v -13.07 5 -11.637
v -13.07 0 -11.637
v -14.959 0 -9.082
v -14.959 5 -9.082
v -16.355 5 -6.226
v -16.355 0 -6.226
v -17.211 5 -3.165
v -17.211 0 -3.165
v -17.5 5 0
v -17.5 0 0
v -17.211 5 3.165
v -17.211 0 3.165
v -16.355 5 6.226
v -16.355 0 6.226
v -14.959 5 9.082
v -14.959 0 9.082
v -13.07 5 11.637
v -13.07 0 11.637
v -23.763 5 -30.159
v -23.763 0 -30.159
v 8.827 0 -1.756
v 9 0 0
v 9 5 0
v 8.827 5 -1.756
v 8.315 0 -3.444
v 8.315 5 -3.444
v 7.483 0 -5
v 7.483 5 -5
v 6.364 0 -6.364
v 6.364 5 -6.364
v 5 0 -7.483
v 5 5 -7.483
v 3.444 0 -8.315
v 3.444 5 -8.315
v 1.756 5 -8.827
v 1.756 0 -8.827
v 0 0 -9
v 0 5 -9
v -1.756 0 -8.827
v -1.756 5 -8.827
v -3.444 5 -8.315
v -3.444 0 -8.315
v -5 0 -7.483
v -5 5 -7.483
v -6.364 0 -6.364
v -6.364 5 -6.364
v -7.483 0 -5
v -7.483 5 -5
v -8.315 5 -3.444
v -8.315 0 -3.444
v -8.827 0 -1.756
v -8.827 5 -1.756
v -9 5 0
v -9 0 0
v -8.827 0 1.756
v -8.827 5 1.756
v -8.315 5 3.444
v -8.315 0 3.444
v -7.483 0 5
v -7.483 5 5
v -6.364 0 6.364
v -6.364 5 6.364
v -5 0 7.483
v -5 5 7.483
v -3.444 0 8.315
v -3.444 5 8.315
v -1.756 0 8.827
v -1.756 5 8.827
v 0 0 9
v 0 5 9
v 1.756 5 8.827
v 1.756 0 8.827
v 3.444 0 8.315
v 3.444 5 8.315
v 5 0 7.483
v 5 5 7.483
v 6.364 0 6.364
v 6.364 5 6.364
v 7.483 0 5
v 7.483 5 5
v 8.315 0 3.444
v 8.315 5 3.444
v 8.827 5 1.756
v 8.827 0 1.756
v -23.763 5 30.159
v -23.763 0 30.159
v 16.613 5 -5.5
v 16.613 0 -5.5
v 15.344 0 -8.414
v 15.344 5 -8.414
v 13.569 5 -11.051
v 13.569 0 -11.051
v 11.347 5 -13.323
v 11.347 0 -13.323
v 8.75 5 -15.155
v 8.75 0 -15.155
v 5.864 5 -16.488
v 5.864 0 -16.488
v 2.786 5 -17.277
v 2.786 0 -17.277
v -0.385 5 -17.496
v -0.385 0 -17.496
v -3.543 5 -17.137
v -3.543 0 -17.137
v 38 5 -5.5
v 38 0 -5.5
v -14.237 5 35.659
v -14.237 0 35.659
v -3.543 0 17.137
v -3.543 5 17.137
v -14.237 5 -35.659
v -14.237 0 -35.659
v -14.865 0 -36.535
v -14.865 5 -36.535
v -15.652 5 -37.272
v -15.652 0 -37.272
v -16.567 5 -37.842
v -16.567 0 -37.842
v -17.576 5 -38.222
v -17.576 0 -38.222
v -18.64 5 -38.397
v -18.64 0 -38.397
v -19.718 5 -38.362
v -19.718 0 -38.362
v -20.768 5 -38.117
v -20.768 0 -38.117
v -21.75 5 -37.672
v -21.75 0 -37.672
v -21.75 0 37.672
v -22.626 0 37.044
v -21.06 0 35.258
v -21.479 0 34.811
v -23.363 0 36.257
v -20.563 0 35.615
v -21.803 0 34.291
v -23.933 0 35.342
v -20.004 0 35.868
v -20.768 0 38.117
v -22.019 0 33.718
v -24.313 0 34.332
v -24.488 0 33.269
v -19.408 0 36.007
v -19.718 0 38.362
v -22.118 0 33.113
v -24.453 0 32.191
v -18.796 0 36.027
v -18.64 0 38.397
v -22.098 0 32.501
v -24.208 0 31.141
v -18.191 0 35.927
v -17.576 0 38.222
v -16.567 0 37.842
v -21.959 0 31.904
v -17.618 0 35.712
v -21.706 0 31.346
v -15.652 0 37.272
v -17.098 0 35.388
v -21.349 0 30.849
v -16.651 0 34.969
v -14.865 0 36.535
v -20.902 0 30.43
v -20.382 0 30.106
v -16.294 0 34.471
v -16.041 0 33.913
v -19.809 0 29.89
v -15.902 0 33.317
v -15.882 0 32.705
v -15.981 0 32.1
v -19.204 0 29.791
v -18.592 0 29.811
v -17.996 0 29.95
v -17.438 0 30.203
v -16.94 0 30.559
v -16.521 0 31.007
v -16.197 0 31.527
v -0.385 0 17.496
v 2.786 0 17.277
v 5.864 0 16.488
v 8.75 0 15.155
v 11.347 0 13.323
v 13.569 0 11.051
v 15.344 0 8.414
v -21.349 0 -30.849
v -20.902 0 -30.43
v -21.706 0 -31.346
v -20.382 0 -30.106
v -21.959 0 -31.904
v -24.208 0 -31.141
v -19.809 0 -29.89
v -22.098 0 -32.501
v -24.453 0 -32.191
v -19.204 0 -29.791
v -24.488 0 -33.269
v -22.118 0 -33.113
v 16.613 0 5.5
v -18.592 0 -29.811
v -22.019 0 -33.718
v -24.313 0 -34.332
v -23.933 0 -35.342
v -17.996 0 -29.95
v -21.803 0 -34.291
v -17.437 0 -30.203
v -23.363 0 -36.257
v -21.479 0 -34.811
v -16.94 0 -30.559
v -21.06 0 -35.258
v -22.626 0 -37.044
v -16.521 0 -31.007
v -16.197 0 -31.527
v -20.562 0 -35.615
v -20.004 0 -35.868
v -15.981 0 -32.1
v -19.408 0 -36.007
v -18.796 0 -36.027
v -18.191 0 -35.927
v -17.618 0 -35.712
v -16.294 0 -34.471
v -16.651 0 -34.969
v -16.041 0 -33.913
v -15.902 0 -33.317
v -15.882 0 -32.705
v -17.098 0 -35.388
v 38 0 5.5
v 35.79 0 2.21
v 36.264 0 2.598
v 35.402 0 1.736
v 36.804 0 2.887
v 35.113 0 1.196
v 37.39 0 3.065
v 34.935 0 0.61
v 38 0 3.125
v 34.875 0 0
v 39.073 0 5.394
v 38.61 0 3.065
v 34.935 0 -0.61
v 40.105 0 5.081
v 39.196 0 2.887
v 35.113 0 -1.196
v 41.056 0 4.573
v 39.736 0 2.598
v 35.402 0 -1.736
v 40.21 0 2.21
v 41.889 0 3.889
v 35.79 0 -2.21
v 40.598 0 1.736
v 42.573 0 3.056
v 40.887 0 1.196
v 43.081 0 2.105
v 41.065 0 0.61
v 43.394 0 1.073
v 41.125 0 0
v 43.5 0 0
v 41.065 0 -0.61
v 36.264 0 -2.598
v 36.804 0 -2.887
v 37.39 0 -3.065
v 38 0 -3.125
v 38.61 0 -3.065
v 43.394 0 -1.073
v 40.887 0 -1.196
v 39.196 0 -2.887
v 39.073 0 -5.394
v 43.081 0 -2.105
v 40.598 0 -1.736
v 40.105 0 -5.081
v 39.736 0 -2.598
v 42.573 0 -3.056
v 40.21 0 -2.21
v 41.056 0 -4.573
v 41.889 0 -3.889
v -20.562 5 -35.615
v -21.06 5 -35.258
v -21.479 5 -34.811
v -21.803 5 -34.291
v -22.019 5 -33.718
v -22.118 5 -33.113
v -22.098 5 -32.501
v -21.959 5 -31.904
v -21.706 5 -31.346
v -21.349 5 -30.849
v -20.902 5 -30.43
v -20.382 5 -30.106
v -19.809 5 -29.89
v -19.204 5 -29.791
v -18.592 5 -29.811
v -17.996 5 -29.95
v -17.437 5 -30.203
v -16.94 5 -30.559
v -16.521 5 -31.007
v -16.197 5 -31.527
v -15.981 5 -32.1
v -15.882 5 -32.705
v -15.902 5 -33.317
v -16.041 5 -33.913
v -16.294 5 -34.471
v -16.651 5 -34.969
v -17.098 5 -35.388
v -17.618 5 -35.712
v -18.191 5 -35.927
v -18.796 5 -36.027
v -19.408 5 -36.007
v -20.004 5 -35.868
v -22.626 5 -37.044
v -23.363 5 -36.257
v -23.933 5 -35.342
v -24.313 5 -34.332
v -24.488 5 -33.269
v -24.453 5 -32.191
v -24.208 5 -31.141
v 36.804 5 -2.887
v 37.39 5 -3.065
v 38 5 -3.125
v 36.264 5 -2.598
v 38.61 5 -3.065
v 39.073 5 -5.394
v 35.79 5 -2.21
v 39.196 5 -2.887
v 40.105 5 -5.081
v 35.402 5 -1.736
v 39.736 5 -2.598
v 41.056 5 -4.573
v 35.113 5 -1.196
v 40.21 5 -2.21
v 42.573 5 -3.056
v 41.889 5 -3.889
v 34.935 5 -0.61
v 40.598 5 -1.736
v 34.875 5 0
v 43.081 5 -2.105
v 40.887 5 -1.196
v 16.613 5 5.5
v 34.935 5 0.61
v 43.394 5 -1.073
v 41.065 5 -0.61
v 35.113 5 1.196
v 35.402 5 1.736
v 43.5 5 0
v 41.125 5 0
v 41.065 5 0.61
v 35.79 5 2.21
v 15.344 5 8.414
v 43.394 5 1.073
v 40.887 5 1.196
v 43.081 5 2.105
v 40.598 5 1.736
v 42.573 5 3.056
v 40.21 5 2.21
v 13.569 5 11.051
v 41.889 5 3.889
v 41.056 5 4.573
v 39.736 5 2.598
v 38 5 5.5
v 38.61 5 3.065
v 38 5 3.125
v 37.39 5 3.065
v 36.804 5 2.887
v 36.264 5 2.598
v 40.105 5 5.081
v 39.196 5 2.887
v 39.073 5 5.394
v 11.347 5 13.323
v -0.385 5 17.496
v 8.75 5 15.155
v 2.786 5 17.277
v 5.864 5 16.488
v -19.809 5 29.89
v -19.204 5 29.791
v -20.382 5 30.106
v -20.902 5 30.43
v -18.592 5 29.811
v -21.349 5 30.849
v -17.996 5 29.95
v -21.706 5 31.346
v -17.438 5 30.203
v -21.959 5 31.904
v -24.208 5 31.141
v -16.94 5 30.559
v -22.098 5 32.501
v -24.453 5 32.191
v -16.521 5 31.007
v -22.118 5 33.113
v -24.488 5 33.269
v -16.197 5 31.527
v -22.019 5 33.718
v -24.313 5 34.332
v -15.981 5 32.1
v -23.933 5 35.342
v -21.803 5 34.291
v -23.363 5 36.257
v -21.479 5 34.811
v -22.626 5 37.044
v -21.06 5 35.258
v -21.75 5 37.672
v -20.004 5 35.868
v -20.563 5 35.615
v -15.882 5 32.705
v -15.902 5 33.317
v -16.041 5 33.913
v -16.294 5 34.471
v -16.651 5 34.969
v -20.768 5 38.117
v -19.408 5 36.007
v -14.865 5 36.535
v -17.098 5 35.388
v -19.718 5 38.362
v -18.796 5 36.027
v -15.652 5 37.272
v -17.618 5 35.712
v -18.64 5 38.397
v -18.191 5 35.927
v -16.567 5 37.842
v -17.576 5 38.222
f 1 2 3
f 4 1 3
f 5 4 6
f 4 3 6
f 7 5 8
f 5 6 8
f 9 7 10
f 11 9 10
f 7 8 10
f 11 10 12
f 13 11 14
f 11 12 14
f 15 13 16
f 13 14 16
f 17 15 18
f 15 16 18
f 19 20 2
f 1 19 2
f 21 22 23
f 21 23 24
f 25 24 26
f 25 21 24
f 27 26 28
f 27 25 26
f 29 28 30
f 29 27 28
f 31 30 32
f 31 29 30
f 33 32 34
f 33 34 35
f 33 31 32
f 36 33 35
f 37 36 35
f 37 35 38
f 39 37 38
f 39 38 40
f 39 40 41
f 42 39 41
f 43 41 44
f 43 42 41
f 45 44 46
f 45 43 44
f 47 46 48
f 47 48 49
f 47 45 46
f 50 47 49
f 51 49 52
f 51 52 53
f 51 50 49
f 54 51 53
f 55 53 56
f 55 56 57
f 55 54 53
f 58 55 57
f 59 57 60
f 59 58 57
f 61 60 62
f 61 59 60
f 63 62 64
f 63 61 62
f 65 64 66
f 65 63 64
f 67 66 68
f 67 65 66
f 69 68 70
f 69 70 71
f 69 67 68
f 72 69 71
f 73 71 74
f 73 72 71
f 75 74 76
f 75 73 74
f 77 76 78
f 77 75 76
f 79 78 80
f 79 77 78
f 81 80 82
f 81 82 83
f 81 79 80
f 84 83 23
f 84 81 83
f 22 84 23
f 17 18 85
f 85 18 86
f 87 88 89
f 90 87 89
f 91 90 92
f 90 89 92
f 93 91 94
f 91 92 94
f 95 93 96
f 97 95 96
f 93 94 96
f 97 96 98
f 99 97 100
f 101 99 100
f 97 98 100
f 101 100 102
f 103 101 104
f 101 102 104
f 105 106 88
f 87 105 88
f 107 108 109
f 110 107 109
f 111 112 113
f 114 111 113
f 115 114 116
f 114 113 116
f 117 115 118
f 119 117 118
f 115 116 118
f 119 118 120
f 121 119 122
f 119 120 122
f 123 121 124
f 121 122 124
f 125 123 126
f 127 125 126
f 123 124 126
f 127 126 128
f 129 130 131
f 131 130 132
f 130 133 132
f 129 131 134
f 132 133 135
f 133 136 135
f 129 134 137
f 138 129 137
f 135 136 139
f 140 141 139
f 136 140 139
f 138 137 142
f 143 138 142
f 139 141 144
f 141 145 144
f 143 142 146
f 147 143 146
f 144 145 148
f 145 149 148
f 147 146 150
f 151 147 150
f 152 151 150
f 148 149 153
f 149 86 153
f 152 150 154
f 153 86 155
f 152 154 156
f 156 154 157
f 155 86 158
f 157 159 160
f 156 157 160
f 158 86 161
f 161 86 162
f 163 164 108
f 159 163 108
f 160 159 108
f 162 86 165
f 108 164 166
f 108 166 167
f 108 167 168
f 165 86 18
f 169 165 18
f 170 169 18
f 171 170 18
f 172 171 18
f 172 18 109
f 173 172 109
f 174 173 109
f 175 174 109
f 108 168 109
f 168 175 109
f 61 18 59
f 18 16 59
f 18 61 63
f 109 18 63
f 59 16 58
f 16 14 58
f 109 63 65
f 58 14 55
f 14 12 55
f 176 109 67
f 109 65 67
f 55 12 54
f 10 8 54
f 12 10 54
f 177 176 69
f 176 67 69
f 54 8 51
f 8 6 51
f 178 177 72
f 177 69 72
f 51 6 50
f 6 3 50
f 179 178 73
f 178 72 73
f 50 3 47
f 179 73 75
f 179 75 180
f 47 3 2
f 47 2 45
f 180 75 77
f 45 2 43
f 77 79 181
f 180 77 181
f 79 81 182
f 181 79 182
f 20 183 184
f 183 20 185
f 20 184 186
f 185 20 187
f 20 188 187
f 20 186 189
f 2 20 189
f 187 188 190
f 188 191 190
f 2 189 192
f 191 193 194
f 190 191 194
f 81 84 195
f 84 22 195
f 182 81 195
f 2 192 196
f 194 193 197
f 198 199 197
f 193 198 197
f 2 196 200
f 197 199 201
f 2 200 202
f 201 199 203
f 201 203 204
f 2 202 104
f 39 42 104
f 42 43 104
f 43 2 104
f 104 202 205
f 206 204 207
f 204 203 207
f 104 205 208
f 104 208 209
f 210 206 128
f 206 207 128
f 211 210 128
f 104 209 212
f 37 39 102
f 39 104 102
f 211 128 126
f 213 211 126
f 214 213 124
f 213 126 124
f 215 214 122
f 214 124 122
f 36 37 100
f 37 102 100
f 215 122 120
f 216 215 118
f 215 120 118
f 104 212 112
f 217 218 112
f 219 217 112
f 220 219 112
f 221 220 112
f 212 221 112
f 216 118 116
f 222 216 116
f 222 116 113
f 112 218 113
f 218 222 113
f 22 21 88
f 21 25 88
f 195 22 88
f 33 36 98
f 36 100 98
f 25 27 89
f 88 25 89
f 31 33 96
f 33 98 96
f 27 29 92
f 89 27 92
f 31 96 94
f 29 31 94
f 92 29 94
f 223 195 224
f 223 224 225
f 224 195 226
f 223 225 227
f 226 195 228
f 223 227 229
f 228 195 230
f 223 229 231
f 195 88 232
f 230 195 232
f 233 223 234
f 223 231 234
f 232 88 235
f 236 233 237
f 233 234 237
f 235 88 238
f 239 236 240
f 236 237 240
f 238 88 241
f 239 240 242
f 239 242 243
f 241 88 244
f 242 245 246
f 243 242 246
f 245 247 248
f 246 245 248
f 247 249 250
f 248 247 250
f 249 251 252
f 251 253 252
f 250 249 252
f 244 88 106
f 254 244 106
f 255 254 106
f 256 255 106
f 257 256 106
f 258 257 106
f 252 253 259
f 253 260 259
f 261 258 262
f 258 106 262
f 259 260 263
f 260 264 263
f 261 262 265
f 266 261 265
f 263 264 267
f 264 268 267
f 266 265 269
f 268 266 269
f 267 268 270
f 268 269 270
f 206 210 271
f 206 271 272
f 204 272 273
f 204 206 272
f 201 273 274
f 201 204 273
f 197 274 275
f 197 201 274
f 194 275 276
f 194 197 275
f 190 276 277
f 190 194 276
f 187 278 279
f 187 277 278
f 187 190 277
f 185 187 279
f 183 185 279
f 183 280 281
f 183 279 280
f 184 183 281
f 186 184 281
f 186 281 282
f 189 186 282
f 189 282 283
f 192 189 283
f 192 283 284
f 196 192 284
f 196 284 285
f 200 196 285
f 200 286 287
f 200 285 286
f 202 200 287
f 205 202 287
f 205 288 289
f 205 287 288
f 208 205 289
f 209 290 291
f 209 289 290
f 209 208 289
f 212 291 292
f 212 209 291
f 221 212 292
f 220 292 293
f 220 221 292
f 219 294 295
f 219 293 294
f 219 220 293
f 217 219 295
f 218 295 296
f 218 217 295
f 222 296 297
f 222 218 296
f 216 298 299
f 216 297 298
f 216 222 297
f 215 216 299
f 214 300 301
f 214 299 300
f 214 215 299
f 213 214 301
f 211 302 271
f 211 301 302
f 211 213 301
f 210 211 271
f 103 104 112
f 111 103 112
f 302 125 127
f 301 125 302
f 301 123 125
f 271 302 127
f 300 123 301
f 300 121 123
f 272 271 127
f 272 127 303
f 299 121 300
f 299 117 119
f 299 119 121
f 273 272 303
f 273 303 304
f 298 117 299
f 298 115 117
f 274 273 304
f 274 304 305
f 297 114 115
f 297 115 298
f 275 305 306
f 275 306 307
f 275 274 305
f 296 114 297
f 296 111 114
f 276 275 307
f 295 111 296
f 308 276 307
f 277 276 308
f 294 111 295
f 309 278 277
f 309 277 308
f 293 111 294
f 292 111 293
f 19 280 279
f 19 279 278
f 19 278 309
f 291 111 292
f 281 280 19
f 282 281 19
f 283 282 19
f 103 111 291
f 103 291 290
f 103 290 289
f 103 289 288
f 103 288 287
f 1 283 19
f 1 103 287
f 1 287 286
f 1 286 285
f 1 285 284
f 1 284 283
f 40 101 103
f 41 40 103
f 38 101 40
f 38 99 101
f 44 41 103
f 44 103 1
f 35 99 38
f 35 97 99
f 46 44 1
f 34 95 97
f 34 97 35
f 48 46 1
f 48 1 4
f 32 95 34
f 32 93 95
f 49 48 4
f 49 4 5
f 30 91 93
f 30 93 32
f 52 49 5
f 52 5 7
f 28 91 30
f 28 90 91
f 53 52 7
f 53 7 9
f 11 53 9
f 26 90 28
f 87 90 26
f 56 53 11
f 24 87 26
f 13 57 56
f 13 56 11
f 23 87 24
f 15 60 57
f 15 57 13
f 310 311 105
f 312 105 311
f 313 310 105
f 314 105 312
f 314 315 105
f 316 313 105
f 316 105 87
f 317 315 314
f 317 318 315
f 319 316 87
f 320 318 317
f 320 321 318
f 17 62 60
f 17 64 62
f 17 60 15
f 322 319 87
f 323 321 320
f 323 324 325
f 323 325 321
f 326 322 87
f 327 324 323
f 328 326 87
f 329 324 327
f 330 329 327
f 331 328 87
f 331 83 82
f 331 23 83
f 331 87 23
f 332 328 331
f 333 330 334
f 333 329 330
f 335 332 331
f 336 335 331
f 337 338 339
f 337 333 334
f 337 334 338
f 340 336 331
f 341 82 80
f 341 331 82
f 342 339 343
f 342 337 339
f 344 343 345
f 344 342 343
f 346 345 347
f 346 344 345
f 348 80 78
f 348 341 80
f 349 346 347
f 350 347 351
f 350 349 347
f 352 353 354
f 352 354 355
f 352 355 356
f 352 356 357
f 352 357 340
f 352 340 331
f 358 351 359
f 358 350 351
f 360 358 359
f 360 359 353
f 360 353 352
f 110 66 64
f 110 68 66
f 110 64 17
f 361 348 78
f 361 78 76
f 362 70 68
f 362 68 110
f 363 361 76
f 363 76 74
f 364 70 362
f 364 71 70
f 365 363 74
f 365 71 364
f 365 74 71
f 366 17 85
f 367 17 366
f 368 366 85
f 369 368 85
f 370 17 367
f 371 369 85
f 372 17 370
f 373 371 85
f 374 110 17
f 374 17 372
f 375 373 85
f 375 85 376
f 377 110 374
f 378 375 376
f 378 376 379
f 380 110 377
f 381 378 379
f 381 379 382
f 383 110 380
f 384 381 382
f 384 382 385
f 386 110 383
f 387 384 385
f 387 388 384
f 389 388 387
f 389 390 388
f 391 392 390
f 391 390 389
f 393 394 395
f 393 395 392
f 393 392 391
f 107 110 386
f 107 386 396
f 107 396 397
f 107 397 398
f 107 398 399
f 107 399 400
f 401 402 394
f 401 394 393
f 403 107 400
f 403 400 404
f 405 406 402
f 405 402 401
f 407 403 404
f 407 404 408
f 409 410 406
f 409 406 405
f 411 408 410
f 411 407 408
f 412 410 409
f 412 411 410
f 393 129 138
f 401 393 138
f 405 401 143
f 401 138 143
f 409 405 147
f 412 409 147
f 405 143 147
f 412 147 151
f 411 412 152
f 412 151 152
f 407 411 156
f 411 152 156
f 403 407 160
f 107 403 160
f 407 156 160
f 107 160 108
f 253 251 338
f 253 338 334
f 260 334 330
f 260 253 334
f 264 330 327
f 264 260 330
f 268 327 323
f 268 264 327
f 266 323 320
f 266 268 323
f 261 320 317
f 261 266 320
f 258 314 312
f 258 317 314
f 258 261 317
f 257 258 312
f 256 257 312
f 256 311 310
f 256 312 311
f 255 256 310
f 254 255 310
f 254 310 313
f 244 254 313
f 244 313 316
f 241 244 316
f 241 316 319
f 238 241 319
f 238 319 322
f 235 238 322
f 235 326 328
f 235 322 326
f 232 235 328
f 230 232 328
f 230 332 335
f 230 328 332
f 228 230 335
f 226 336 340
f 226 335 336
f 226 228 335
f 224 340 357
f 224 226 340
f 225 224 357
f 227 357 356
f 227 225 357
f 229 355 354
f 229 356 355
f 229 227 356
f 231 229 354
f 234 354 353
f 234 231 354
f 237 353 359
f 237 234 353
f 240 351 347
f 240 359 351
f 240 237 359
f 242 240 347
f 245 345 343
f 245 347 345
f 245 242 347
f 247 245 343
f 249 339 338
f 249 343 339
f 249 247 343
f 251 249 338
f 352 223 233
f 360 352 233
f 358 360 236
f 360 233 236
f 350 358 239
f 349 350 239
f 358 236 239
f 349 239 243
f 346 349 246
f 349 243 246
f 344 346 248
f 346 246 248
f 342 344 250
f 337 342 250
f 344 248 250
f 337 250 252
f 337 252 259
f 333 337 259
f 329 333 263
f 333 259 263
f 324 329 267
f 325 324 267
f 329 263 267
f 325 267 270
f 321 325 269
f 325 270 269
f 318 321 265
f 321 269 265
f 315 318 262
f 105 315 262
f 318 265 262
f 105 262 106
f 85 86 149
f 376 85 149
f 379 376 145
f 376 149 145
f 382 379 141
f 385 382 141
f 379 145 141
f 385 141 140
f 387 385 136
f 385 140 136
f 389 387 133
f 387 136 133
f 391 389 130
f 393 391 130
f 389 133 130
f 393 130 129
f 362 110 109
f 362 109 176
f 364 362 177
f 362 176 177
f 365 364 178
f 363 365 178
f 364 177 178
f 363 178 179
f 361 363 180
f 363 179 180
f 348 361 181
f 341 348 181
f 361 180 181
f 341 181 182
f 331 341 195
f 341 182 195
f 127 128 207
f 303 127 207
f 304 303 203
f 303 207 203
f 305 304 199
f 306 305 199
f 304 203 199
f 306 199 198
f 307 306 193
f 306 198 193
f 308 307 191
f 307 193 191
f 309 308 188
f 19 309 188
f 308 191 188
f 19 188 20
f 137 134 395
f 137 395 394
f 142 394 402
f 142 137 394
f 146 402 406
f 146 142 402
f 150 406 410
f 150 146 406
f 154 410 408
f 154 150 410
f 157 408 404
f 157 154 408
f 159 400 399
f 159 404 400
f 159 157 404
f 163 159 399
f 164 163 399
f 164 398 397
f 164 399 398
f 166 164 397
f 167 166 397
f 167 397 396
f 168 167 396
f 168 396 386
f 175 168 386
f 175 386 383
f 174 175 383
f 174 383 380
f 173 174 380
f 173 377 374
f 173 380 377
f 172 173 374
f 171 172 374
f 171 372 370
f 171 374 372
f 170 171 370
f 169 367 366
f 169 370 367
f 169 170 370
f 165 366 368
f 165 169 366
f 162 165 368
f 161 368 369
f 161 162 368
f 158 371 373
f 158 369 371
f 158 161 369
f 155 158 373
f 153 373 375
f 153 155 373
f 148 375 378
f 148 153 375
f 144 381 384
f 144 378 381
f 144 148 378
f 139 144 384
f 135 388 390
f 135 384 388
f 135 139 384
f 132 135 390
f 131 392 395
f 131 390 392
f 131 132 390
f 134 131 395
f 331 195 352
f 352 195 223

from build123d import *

# Parameters (mm, degrees)
SKETCH1_R           = 17.5
SKETCH1_R_2         = 9
BOSS_EXTRUDE1_DEPTH = 5
BOSS_EXTRUDE3_DEPTH = 5
CUT_EXTRUDE1_START  = -6
SKETCH4_R           = 3.125
CUT_EXTRUDE1_DEPTH  = 7
CIRPATTERN1_COUNT   = 3


with BuildPart() as part:
    # Sketch1 → Boss-Extrude1 (new body)
    with BuildSketch(Plane(origin=(0, 0, 0), x_dir=(1, 0, 0), z_dir=(0, 1, 0))):
        Circle(SKETCH1_R)
        Circle(SKETCH1_R_2, mode=Mode.SUBTRACT)
    extrude(amount=BOSS_EXTRUDE1_DEPTH)

    # Sketch3 → Boss-Extrude3 (add)
    with BuildSketch(Plane(origin=(0, 0, 0), x_dir=(1, 0, 0), z_dir=(0, 1, 0))):
        with BuildLine():
            Line((38, 5.5), (10.009906254, 5.5))
            Line((10.009906254, 5.5), (10.009906254, -5.5))
            Line((10.009906254, -5.5), (38, -5.5))
            ThreePointArc((38, -5.5), (32.5, 0), (38, 5.5))
        make_face()
        with BuildLine():
            ThreePointArc((43.5, 0), (41.889087297, 3.889087297), (38, 5.5))
            Line((38, 5.5), (38, -5.5))
            ThreePointArc((38, -5.5), (41.889087297, -3.889087297), (43.5, 0))
        make_face()
        with BuildLine():
            Line((38, -5.5), (38, 5.5))
            ThreePointArc((38, 5.5), (32.5, 0), (38, -5.5))
        make_face()
    boss_extrude3 = extrude(amount=BOSS_EXTRUDE3_DEPTH)

    # Sketch4 → Cut-Extrude1 (cut)
    with BuildSketch(Plane(origin=(0, 5, 0), x_dir=(1, 0, 0), z_dir=(0, 1, 0)).offset(CUT_EXTRUDE1_START)):
        with Locations((38, 0)):
            Circle(SKETCH4_R)
    cut_extrude1 = extrude(amount=CUT_EXTRUDE1_DEPTH, mode=Mode.SUBTRACT)

    # CirPattern1: Boss-Extrude3, Cut-Extrude1 ×3 about axis
    cirpattern1_axis = Axis((0, 0, 0), (0, 1, 0))
    for i in range(1, CIRPATTERN1_COUNT):
        add(boss_extrude3.rotate(cirpattern1_axis, i * 360 / CIRPATTERN1_COUNT))
        add(cut_extrude1.rotate(cirpattern1_axis, i * 360 / CIRPATTERN1_COUNT), mode=Mode.SUBTRACT)


solid = part.part
